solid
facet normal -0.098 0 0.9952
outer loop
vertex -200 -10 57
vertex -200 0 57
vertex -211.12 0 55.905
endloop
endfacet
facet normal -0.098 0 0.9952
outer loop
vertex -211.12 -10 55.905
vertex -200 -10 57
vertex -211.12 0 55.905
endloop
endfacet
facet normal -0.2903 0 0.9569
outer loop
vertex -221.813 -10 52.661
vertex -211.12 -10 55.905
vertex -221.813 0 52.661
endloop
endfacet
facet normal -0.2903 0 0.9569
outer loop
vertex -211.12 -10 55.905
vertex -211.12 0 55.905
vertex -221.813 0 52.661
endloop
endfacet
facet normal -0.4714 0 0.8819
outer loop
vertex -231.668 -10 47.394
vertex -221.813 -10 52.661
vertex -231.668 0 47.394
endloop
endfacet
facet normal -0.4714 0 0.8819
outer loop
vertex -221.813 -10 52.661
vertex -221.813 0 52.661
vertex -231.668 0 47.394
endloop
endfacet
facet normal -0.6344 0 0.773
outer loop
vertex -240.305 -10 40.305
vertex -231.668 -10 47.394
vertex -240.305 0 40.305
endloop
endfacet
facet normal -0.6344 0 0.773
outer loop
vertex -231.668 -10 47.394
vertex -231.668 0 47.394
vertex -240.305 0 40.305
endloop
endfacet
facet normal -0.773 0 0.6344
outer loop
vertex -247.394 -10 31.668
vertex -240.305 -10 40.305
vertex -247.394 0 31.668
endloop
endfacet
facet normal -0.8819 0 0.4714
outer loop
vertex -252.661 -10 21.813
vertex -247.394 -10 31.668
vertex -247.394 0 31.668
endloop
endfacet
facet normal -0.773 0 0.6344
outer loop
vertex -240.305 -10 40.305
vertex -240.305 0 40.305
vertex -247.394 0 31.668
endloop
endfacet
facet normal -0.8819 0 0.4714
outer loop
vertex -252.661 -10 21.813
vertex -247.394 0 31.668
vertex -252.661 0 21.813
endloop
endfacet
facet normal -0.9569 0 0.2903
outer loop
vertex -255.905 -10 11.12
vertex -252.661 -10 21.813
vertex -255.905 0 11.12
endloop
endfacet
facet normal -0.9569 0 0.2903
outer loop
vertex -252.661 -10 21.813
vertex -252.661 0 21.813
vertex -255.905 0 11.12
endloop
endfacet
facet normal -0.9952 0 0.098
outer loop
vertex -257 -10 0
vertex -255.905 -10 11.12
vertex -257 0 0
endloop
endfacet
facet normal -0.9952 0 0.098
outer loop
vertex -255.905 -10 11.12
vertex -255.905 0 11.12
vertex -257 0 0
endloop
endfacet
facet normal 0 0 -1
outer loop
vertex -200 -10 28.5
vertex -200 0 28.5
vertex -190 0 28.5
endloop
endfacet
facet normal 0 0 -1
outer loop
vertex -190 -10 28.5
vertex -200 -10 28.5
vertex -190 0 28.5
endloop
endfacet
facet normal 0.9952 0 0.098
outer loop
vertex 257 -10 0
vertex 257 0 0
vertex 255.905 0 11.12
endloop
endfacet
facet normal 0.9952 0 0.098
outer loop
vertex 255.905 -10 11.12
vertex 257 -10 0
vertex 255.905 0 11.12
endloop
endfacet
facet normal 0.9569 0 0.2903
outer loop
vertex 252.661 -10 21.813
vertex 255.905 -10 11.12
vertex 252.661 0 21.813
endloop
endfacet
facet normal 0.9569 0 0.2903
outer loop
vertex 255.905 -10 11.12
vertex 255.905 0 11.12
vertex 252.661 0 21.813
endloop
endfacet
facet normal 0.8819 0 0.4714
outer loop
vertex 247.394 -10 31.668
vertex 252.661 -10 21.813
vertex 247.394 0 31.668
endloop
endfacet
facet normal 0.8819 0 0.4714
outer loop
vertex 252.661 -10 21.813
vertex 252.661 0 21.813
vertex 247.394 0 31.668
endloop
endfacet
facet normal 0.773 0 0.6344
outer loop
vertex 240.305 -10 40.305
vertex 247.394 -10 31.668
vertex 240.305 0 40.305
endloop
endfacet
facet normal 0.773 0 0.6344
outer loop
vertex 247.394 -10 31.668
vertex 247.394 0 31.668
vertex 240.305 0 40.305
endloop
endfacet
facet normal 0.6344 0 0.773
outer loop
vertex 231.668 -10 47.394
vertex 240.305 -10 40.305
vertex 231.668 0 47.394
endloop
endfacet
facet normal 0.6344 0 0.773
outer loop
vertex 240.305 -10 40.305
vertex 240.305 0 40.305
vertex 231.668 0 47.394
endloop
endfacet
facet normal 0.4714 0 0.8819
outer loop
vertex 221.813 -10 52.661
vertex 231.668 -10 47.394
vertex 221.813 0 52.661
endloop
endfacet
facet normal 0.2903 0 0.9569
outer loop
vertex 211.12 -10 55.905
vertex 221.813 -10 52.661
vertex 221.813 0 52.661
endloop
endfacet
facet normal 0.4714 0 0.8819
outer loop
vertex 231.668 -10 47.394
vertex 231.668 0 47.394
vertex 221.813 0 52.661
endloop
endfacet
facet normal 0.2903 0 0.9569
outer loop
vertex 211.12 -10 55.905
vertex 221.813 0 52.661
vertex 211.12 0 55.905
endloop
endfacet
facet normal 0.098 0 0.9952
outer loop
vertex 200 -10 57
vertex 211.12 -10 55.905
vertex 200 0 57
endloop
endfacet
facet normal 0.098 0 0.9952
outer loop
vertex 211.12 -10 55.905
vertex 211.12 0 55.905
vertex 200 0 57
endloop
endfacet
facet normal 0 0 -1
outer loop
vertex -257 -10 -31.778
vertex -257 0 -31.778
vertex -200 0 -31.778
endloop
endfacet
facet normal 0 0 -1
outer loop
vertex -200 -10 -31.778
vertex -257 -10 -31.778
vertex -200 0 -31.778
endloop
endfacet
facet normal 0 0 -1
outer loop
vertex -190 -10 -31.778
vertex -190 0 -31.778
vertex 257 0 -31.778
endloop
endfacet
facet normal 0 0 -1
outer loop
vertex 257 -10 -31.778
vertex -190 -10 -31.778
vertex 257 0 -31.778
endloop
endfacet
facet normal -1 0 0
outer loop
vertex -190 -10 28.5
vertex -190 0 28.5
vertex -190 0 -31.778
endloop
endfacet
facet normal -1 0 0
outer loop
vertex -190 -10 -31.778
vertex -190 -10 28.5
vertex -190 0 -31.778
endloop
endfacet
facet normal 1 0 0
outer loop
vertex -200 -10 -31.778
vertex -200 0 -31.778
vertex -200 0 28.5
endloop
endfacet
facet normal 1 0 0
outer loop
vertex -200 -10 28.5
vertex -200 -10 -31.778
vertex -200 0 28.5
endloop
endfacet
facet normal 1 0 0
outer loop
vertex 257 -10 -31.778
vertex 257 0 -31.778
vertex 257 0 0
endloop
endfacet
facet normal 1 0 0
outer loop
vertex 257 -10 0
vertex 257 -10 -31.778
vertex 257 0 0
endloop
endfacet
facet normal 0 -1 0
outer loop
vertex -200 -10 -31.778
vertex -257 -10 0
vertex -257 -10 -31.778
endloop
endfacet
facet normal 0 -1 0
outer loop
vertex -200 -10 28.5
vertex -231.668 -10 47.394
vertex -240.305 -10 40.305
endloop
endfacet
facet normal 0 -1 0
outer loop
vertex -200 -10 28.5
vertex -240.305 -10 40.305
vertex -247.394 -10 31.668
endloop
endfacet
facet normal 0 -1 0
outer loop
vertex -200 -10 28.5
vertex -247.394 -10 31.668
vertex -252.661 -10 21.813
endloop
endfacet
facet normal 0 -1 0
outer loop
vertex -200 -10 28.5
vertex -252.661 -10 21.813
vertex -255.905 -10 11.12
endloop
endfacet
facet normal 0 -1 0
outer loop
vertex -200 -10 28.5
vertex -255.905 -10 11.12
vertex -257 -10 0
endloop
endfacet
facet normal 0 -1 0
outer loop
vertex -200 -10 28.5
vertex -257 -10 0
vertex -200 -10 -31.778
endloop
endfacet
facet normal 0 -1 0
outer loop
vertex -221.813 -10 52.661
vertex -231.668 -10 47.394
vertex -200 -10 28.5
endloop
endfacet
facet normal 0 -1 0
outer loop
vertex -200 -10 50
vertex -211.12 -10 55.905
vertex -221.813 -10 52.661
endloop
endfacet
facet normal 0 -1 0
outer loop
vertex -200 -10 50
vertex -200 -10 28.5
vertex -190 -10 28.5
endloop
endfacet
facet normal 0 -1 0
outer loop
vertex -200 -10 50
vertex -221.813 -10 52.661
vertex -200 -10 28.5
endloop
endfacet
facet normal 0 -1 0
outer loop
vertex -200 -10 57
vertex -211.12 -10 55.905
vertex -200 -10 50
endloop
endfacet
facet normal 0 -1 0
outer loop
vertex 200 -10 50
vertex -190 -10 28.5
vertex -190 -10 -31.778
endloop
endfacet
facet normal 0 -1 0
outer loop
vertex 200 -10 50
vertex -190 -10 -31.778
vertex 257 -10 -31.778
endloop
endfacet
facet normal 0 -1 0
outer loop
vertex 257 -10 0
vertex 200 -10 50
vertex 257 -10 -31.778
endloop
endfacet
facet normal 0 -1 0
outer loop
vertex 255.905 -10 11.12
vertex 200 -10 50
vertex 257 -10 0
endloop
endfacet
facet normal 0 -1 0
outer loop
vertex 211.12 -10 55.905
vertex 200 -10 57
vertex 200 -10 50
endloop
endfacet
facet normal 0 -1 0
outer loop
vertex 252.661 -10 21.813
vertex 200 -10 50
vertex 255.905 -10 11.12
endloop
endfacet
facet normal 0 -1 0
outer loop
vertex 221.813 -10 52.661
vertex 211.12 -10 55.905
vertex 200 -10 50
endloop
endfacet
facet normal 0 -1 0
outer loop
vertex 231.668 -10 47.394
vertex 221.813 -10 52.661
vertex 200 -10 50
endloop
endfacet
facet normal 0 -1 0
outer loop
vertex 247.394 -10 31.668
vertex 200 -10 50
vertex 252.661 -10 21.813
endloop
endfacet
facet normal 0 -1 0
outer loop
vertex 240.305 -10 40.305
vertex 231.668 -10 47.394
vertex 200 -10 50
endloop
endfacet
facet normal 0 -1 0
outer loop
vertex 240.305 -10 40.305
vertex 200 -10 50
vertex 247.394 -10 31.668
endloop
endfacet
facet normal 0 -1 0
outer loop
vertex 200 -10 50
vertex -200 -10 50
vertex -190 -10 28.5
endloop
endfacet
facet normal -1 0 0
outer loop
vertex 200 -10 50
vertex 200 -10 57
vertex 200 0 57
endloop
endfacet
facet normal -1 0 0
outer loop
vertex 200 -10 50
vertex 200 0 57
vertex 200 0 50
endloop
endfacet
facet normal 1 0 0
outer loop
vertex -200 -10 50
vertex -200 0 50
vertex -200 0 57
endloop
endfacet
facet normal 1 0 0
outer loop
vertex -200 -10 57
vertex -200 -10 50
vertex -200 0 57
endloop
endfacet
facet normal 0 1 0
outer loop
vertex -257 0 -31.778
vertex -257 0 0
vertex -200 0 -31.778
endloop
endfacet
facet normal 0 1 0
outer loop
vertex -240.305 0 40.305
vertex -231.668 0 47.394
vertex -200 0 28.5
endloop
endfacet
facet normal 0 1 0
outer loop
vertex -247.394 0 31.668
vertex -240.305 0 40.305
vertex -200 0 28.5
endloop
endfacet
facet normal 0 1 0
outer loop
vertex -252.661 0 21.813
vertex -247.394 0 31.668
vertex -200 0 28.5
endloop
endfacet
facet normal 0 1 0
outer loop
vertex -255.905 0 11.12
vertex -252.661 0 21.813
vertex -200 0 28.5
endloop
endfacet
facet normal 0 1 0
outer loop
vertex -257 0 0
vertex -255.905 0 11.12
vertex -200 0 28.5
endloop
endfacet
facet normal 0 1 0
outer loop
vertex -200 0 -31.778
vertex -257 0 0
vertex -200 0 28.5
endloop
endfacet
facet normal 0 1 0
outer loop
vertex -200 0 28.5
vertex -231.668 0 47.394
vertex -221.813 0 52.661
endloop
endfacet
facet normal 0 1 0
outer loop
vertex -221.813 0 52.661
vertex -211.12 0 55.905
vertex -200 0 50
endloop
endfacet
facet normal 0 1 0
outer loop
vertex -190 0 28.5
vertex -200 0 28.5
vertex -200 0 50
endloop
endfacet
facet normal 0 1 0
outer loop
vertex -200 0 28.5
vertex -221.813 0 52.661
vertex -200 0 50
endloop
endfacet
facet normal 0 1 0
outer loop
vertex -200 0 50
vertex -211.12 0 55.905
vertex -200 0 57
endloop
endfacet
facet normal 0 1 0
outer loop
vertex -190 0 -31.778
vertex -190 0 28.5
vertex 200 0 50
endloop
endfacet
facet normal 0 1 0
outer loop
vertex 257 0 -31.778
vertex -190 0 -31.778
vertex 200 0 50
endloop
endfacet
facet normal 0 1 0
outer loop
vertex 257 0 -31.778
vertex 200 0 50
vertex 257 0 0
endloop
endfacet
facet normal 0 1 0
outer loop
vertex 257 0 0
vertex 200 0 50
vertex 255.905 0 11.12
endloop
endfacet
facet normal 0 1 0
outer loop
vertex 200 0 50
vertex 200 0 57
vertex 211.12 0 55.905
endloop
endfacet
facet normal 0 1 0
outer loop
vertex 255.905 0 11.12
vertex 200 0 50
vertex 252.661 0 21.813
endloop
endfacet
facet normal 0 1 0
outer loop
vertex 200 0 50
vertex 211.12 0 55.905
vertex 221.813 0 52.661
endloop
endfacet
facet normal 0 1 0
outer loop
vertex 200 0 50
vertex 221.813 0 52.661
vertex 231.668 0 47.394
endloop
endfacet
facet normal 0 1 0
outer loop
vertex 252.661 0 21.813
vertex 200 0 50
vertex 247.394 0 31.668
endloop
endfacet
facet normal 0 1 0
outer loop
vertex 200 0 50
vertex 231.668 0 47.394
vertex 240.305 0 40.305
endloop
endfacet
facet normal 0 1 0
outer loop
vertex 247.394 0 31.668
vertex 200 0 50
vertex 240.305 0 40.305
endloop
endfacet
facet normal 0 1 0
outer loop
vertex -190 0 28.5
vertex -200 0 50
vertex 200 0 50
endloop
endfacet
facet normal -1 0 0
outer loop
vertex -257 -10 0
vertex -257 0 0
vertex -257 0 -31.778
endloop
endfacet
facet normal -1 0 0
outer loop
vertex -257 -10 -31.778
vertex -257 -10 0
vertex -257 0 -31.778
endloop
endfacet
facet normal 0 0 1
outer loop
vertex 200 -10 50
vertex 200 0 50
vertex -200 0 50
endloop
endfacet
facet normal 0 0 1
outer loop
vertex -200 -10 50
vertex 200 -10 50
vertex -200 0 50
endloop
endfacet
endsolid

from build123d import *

# Parameters (mm, degrees)
F1_DEPTH = 10


with BuildPart() as f1:
    # F0 (on Front) → F1 (new body)
    with BuildSketch(Plane.XZ):
        with BuildLine():
            Line((-200, 50), (-200, 57))
            ThreePointArc((-200, 57), (-240.305087, 40.305087), (-257, 0))
            Line((-257, 0), (-257, -31.777661))
            Line((-257, -31.777661), (-200, -31.777661))
            Line((-200, -31.777661), (-200, 0))
            Line((-200, 0), (-200, 28.5))
            Line((-200, 28.5), (-190, 28.5))
            Line((-190, 28.5), (-190, 0))
            Line((-190, 0), (-190, -31.777661))
            Line((-190, -31.777661), (190, -31.777661))
            Line((190, -31.777661), (200, -31.777661))
            Line((200, -31.777661), (257, -31.777661))
            Line((257, -31.777661), (257, 0))
            ThreePointArc((257, 0), (240.305087, 40.305087), (200, 57))
            Line((200, 57), (200, 50))
            Line((200, 50), (-200, 50))
        make_face()
    extrude(amount=F1_DEPTH)


solid = f1.part
